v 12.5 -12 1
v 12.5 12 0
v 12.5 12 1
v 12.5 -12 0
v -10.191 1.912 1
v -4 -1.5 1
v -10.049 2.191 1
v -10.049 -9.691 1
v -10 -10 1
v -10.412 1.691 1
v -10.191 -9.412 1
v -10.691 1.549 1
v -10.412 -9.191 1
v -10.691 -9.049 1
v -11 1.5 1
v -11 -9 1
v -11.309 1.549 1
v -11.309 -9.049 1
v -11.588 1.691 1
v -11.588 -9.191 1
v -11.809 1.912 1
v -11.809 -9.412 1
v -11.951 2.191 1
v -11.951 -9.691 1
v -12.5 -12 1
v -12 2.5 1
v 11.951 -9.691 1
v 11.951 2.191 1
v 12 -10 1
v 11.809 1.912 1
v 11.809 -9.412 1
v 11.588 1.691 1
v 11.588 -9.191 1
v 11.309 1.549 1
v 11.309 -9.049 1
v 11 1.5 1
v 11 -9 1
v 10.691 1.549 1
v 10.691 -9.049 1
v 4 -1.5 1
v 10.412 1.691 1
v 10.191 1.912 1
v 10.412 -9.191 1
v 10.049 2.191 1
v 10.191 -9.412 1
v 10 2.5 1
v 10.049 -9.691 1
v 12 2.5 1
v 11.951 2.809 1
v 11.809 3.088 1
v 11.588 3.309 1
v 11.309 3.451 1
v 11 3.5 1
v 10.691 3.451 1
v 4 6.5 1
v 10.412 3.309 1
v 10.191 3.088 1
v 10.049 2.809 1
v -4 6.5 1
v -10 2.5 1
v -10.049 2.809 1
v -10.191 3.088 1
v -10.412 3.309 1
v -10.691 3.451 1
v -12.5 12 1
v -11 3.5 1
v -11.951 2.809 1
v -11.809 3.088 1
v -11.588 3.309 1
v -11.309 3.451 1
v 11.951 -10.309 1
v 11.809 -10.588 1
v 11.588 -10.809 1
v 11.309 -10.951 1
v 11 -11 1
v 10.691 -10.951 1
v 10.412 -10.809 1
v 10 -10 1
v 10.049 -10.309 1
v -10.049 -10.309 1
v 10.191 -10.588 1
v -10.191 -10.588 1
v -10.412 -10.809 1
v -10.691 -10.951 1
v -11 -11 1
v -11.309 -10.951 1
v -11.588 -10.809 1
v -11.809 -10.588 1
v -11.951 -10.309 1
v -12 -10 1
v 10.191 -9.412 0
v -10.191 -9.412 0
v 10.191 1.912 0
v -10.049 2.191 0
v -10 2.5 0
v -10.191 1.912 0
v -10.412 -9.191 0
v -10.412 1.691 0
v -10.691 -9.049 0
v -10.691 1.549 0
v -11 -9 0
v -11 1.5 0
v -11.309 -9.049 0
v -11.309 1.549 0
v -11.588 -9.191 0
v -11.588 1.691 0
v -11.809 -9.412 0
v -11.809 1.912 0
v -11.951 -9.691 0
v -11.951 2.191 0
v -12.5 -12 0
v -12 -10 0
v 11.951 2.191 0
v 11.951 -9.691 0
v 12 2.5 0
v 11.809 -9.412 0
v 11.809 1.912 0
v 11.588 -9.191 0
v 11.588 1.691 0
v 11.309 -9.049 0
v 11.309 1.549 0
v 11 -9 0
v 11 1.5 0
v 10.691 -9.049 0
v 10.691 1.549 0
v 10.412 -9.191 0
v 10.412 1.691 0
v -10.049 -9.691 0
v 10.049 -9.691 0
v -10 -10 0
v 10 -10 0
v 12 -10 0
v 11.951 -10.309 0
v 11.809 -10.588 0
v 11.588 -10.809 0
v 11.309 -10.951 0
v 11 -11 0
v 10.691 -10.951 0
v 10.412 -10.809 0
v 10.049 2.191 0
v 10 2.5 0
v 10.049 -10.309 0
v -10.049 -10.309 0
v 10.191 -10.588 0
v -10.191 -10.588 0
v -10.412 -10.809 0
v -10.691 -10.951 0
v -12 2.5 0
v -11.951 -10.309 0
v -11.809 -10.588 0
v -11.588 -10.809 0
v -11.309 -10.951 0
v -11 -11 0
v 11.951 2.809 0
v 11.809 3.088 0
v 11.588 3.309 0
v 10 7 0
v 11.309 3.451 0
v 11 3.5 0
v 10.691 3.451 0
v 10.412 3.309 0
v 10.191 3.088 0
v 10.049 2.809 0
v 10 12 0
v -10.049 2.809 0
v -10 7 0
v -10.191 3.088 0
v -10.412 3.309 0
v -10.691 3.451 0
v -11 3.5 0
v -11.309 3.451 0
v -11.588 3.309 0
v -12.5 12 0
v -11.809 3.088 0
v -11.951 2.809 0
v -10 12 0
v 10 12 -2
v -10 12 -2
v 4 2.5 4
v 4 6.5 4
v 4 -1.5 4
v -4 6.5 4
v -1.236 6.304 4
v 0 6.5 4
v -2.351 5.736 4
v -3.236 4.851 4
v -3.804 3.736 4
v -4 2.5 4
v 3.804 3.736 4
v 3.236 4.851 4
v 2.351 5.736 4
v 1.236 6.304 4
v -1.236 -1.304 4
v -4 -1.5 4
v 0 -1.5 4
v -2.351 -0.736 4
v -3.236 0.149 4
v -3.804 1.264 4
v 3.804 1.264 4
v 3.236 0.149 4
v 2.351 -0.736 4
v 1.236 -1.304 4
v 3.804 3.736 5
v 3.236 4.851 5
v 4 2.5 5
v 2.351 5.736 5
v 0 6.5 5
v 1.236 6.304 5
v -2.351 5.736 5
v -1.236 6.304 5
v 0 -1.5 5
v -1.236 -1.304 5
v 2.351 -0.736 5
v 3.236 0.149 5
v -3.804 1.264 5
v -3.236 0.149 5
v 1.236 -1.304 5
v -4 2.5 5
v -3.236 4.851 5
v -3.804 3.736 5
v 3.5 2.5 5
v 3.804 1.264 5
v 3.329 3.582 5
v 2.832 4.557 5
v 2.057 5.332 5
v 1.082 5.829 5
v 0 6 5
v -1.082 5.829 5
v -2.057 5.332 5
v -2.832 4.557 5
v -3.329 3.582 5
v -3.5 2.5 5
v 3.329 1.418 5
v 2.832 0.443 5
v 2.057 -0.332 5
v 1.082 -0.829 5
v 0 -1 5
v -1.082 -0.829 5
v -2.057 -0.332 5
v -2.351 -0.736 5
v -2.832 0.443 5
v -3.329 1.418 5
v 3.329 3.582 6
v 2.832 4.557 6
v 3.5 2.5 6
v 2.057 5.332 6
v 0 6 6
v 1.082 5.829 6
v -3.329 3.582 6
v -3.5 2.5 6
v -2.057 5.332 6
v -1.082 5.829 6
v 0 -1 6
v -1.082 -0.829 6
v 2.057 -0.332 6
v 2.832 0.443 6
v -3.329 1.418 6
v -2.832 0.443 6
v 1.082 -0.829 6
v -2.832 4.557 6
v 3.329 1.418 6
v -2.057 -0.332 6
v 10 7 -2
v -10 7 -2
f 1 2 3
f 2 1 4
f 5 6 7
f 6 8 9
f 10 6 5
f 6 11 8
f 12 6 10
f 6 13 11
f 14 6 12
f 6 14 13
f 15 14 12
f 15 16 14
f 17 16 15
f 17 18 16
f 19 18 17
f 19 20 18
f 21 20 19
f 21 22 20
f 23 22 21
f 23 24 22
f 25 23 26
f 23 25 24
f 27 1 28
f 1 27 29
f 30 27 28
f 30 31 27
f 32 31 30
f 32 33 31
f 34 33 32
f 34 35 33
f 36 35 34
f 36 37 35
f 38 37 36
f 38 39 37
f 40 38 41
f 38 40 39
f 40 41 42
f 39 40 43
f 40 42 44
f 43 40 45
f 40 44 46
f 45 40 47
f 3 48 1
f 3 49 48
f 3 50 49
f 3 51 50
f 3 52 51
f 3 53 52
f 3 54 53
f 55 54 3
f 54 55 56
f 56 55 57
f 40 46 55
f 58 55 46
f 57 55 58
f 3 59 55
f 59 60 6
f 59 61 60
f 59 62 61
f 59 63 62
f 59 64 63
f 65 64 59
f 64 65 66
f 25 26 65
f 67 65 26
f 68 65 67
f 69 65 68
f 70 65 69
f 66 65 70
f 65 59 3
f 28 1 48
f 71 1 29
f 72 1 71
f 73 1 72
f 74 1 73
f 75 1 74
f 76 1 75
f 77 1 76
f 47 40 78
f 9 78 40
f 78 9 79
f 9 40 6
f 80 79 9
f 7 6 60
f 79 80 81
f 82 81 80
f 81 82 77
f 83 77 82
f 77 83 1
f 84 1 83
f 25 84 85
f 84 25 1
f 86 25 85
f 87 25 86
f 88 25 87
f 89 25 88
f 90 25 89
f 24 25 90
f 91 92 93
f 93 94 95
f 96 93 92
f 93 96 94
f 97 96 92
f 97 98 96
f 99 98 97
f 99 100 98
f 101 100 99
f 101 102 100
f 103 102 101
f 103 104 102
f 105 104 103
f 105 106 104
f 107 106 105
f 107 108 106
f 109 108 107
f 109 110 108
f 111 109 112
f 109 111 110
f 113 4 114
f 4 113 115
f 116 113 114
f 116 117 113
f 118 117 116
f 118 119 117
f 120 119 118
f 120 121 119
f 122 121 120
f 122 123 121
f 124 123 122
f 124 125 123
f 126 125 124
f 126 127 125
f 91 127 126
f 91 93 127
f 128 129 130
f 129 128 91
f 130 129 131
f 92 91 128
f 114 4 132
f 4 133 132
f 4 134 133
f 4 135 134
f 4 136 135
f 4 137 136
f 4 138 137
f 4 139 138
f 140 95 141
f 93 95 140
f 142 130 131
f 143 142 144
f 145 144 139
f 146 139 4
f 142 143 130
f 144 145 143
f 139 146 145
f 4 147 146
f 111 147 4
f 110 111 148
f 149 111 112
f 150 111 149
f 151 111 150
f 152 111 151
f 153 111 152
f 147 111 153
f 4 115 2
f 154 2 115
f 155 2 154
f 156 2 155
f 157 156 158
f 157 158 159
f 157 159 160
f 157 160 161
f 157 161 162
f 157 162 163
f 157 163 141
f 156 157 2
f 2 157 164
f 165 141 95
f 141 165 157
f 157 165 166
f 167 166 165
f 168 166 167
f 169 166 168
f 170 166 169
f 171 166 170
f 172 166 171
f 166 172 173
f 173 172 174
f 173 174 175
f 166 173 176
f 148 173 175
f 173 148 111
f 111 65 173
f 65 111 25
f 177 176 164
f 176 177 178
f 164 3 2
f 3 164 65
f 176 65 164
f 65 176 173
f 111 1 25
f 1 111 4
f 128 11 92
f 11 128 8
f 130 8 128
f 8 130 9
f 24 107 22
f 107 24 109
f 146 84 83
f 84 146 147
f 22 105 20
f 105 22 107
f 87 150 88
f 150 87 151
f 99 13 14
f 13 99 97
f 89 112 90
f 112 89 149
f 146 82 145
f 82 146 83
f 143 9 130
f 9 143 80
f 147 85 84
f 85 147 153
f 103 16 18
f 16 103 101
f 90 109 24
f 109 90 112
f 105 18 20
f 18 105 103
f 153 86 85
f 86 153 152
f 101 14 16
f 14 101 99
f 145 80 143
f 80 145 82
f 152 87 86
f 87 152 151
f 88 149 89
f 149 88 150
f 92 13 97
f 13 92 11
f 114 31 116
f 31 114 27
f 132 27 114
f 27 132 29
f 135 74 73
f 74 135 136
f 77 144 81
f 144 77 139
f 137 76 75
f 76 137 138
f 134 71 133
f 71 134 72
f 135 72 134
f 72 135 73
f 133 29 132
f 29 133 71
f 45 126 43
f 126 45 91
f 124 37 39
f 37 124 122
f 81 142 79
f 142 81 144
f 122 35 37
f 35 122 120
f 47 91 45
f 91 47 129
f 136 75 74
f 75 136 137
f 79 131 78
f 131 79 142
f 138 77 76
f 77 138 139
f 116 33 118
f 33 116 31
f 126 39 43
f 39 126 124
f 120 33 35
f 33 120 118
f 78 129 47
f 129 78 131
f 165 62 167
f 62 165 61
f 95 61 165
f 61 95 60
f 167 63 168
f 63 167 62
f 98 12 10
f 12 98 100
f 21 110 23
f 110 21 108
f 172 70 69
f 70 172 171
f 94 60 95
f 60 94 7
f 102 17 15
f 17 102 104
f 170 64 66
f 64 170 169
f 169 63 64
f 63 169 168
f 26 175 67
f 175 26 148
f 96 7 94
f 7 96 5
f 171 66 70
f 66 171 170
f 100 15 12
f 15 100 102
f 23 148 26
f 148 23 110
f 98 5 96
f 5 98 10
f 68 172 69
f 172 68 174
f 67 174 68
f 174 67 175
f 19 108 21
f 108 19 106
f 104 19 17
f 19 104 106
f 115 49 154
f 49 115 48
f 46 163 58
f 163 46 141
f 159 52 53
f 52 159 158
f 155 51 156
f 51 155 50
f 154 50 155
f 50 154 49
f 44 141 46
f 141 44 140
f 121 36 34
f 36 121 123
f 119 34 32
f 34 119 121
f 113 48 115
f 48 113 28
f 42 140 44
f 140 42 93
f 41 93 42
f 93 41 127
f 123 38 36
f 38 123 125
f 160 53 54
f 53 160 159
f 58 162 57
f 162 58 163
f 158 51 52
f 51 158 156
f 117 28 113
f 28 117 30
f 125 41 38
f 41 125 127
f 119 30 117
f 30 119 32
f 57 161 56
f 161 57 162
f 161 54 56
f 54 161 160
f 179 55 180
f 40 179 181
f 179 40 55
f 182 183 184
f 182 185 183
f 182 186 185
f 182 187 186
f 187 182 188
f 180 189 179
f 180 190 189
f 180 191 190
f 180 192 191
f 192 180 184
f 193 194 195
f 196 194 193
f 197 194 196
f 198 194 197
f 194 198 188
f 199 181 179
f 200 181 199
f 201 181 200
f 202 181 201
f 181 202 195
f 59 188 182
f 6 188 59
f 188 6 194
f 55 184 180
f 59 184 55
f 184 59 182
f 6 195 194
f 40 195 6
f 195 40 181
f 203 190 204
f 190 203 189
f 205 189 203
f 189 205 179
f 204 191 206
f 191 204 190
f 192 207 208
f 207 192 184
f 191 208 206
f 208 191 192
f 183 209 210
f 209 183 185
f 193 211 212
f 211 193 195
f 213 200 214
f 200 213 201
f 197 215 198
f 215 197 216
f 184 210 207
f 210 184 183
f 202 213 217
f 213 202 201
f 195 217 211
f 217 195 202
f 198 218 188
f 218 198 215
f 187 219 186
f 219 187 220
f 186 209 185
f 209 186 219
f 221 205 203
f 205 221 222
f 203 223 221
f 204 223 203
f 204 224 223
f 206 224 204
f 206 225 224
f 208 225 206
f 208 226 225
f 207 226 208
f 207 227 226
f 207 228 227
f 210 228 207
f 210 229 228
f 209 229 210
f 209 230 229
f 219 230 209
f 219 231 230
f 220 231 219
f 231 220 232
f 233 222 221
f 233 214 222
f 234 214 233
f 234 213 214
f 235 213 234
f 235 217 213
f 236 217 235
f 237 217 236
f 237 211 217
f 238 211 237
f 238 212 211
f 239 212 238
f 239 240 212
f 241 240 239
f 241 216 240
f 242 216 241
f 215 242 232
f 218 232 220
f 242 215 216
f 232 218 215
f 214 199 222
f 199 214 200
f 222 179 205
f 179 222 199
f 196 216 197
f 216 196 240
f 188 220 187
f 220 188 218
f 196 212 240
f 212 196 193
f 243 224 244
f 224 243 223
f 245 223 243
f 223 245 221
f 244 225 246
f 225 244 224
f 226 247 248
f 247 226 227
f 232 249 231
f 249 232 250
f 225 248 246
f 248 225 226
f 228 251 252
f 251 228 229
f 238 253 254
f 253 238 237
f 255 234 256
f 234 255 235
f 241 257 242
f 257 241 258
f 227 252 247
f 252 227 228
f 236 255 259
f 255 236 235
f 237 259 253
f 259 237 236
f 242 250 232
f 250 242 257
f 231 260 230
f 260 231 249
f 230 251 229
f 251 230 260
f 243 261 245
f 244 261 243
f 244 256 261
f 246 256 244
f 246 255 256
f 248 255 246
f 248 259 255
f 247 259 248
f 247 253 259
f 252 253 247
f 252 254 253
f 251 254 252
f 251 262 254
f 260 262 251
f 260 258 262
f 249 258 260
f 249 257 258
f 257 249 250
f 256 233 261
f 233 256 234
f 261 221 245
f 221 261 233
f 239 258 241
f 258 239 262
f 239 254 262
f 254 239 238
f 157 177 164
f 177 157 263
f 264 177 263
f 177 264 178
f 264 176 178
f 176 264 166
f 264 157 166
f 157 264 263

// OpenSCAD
// file: params.scad
DOME_DIA = 150;
DOME_THICK = 2.5;
ORING_DIA = 5.4;

function r_from_dia(d) = d / 2;
// main file
include<params.scad>

module camera()
{
    color([0,1,0,1])
    difference()
    {
        translate([0,0,0.5])
            cube([25,24,1], center=true);
        translate([-11,-10,0])
            cylinder(r=r_from_dia(2), h=10, center=true, $fn = 20);
        translate([11,-10,0])
            cylinder(r=r_from_dia(2), h=10, center=true, $fn = 20);
        translate([-11,2.5,0])
            cylinder(r=r_from_dia(2), h=10, center=true, $fn = 20);
        translate([11,2.5,0])
            cylinder(r=r_from_dia(2), h=10, center=true, $fn = 20);
    }
    color([0.2,0.2,0.2,1]) translate([0,2.5,1])
    union()
    {
        translate([0,0,1.5])
            cube([8,8,3], center=true);
        translate([0,0,2])
            cylinder(r=r_from_dia(8), h=4, center=true, $fn = 20);
        translate([0,0,2.5])
            cylinder(r=r_from_dia(7), h=5, center=true, $fn = 20);
    }
    color([0.7,0.6,0.3,1])
        translate([0,9.5,-1])
            cube([20,5,2], center=true);
}

camera();
